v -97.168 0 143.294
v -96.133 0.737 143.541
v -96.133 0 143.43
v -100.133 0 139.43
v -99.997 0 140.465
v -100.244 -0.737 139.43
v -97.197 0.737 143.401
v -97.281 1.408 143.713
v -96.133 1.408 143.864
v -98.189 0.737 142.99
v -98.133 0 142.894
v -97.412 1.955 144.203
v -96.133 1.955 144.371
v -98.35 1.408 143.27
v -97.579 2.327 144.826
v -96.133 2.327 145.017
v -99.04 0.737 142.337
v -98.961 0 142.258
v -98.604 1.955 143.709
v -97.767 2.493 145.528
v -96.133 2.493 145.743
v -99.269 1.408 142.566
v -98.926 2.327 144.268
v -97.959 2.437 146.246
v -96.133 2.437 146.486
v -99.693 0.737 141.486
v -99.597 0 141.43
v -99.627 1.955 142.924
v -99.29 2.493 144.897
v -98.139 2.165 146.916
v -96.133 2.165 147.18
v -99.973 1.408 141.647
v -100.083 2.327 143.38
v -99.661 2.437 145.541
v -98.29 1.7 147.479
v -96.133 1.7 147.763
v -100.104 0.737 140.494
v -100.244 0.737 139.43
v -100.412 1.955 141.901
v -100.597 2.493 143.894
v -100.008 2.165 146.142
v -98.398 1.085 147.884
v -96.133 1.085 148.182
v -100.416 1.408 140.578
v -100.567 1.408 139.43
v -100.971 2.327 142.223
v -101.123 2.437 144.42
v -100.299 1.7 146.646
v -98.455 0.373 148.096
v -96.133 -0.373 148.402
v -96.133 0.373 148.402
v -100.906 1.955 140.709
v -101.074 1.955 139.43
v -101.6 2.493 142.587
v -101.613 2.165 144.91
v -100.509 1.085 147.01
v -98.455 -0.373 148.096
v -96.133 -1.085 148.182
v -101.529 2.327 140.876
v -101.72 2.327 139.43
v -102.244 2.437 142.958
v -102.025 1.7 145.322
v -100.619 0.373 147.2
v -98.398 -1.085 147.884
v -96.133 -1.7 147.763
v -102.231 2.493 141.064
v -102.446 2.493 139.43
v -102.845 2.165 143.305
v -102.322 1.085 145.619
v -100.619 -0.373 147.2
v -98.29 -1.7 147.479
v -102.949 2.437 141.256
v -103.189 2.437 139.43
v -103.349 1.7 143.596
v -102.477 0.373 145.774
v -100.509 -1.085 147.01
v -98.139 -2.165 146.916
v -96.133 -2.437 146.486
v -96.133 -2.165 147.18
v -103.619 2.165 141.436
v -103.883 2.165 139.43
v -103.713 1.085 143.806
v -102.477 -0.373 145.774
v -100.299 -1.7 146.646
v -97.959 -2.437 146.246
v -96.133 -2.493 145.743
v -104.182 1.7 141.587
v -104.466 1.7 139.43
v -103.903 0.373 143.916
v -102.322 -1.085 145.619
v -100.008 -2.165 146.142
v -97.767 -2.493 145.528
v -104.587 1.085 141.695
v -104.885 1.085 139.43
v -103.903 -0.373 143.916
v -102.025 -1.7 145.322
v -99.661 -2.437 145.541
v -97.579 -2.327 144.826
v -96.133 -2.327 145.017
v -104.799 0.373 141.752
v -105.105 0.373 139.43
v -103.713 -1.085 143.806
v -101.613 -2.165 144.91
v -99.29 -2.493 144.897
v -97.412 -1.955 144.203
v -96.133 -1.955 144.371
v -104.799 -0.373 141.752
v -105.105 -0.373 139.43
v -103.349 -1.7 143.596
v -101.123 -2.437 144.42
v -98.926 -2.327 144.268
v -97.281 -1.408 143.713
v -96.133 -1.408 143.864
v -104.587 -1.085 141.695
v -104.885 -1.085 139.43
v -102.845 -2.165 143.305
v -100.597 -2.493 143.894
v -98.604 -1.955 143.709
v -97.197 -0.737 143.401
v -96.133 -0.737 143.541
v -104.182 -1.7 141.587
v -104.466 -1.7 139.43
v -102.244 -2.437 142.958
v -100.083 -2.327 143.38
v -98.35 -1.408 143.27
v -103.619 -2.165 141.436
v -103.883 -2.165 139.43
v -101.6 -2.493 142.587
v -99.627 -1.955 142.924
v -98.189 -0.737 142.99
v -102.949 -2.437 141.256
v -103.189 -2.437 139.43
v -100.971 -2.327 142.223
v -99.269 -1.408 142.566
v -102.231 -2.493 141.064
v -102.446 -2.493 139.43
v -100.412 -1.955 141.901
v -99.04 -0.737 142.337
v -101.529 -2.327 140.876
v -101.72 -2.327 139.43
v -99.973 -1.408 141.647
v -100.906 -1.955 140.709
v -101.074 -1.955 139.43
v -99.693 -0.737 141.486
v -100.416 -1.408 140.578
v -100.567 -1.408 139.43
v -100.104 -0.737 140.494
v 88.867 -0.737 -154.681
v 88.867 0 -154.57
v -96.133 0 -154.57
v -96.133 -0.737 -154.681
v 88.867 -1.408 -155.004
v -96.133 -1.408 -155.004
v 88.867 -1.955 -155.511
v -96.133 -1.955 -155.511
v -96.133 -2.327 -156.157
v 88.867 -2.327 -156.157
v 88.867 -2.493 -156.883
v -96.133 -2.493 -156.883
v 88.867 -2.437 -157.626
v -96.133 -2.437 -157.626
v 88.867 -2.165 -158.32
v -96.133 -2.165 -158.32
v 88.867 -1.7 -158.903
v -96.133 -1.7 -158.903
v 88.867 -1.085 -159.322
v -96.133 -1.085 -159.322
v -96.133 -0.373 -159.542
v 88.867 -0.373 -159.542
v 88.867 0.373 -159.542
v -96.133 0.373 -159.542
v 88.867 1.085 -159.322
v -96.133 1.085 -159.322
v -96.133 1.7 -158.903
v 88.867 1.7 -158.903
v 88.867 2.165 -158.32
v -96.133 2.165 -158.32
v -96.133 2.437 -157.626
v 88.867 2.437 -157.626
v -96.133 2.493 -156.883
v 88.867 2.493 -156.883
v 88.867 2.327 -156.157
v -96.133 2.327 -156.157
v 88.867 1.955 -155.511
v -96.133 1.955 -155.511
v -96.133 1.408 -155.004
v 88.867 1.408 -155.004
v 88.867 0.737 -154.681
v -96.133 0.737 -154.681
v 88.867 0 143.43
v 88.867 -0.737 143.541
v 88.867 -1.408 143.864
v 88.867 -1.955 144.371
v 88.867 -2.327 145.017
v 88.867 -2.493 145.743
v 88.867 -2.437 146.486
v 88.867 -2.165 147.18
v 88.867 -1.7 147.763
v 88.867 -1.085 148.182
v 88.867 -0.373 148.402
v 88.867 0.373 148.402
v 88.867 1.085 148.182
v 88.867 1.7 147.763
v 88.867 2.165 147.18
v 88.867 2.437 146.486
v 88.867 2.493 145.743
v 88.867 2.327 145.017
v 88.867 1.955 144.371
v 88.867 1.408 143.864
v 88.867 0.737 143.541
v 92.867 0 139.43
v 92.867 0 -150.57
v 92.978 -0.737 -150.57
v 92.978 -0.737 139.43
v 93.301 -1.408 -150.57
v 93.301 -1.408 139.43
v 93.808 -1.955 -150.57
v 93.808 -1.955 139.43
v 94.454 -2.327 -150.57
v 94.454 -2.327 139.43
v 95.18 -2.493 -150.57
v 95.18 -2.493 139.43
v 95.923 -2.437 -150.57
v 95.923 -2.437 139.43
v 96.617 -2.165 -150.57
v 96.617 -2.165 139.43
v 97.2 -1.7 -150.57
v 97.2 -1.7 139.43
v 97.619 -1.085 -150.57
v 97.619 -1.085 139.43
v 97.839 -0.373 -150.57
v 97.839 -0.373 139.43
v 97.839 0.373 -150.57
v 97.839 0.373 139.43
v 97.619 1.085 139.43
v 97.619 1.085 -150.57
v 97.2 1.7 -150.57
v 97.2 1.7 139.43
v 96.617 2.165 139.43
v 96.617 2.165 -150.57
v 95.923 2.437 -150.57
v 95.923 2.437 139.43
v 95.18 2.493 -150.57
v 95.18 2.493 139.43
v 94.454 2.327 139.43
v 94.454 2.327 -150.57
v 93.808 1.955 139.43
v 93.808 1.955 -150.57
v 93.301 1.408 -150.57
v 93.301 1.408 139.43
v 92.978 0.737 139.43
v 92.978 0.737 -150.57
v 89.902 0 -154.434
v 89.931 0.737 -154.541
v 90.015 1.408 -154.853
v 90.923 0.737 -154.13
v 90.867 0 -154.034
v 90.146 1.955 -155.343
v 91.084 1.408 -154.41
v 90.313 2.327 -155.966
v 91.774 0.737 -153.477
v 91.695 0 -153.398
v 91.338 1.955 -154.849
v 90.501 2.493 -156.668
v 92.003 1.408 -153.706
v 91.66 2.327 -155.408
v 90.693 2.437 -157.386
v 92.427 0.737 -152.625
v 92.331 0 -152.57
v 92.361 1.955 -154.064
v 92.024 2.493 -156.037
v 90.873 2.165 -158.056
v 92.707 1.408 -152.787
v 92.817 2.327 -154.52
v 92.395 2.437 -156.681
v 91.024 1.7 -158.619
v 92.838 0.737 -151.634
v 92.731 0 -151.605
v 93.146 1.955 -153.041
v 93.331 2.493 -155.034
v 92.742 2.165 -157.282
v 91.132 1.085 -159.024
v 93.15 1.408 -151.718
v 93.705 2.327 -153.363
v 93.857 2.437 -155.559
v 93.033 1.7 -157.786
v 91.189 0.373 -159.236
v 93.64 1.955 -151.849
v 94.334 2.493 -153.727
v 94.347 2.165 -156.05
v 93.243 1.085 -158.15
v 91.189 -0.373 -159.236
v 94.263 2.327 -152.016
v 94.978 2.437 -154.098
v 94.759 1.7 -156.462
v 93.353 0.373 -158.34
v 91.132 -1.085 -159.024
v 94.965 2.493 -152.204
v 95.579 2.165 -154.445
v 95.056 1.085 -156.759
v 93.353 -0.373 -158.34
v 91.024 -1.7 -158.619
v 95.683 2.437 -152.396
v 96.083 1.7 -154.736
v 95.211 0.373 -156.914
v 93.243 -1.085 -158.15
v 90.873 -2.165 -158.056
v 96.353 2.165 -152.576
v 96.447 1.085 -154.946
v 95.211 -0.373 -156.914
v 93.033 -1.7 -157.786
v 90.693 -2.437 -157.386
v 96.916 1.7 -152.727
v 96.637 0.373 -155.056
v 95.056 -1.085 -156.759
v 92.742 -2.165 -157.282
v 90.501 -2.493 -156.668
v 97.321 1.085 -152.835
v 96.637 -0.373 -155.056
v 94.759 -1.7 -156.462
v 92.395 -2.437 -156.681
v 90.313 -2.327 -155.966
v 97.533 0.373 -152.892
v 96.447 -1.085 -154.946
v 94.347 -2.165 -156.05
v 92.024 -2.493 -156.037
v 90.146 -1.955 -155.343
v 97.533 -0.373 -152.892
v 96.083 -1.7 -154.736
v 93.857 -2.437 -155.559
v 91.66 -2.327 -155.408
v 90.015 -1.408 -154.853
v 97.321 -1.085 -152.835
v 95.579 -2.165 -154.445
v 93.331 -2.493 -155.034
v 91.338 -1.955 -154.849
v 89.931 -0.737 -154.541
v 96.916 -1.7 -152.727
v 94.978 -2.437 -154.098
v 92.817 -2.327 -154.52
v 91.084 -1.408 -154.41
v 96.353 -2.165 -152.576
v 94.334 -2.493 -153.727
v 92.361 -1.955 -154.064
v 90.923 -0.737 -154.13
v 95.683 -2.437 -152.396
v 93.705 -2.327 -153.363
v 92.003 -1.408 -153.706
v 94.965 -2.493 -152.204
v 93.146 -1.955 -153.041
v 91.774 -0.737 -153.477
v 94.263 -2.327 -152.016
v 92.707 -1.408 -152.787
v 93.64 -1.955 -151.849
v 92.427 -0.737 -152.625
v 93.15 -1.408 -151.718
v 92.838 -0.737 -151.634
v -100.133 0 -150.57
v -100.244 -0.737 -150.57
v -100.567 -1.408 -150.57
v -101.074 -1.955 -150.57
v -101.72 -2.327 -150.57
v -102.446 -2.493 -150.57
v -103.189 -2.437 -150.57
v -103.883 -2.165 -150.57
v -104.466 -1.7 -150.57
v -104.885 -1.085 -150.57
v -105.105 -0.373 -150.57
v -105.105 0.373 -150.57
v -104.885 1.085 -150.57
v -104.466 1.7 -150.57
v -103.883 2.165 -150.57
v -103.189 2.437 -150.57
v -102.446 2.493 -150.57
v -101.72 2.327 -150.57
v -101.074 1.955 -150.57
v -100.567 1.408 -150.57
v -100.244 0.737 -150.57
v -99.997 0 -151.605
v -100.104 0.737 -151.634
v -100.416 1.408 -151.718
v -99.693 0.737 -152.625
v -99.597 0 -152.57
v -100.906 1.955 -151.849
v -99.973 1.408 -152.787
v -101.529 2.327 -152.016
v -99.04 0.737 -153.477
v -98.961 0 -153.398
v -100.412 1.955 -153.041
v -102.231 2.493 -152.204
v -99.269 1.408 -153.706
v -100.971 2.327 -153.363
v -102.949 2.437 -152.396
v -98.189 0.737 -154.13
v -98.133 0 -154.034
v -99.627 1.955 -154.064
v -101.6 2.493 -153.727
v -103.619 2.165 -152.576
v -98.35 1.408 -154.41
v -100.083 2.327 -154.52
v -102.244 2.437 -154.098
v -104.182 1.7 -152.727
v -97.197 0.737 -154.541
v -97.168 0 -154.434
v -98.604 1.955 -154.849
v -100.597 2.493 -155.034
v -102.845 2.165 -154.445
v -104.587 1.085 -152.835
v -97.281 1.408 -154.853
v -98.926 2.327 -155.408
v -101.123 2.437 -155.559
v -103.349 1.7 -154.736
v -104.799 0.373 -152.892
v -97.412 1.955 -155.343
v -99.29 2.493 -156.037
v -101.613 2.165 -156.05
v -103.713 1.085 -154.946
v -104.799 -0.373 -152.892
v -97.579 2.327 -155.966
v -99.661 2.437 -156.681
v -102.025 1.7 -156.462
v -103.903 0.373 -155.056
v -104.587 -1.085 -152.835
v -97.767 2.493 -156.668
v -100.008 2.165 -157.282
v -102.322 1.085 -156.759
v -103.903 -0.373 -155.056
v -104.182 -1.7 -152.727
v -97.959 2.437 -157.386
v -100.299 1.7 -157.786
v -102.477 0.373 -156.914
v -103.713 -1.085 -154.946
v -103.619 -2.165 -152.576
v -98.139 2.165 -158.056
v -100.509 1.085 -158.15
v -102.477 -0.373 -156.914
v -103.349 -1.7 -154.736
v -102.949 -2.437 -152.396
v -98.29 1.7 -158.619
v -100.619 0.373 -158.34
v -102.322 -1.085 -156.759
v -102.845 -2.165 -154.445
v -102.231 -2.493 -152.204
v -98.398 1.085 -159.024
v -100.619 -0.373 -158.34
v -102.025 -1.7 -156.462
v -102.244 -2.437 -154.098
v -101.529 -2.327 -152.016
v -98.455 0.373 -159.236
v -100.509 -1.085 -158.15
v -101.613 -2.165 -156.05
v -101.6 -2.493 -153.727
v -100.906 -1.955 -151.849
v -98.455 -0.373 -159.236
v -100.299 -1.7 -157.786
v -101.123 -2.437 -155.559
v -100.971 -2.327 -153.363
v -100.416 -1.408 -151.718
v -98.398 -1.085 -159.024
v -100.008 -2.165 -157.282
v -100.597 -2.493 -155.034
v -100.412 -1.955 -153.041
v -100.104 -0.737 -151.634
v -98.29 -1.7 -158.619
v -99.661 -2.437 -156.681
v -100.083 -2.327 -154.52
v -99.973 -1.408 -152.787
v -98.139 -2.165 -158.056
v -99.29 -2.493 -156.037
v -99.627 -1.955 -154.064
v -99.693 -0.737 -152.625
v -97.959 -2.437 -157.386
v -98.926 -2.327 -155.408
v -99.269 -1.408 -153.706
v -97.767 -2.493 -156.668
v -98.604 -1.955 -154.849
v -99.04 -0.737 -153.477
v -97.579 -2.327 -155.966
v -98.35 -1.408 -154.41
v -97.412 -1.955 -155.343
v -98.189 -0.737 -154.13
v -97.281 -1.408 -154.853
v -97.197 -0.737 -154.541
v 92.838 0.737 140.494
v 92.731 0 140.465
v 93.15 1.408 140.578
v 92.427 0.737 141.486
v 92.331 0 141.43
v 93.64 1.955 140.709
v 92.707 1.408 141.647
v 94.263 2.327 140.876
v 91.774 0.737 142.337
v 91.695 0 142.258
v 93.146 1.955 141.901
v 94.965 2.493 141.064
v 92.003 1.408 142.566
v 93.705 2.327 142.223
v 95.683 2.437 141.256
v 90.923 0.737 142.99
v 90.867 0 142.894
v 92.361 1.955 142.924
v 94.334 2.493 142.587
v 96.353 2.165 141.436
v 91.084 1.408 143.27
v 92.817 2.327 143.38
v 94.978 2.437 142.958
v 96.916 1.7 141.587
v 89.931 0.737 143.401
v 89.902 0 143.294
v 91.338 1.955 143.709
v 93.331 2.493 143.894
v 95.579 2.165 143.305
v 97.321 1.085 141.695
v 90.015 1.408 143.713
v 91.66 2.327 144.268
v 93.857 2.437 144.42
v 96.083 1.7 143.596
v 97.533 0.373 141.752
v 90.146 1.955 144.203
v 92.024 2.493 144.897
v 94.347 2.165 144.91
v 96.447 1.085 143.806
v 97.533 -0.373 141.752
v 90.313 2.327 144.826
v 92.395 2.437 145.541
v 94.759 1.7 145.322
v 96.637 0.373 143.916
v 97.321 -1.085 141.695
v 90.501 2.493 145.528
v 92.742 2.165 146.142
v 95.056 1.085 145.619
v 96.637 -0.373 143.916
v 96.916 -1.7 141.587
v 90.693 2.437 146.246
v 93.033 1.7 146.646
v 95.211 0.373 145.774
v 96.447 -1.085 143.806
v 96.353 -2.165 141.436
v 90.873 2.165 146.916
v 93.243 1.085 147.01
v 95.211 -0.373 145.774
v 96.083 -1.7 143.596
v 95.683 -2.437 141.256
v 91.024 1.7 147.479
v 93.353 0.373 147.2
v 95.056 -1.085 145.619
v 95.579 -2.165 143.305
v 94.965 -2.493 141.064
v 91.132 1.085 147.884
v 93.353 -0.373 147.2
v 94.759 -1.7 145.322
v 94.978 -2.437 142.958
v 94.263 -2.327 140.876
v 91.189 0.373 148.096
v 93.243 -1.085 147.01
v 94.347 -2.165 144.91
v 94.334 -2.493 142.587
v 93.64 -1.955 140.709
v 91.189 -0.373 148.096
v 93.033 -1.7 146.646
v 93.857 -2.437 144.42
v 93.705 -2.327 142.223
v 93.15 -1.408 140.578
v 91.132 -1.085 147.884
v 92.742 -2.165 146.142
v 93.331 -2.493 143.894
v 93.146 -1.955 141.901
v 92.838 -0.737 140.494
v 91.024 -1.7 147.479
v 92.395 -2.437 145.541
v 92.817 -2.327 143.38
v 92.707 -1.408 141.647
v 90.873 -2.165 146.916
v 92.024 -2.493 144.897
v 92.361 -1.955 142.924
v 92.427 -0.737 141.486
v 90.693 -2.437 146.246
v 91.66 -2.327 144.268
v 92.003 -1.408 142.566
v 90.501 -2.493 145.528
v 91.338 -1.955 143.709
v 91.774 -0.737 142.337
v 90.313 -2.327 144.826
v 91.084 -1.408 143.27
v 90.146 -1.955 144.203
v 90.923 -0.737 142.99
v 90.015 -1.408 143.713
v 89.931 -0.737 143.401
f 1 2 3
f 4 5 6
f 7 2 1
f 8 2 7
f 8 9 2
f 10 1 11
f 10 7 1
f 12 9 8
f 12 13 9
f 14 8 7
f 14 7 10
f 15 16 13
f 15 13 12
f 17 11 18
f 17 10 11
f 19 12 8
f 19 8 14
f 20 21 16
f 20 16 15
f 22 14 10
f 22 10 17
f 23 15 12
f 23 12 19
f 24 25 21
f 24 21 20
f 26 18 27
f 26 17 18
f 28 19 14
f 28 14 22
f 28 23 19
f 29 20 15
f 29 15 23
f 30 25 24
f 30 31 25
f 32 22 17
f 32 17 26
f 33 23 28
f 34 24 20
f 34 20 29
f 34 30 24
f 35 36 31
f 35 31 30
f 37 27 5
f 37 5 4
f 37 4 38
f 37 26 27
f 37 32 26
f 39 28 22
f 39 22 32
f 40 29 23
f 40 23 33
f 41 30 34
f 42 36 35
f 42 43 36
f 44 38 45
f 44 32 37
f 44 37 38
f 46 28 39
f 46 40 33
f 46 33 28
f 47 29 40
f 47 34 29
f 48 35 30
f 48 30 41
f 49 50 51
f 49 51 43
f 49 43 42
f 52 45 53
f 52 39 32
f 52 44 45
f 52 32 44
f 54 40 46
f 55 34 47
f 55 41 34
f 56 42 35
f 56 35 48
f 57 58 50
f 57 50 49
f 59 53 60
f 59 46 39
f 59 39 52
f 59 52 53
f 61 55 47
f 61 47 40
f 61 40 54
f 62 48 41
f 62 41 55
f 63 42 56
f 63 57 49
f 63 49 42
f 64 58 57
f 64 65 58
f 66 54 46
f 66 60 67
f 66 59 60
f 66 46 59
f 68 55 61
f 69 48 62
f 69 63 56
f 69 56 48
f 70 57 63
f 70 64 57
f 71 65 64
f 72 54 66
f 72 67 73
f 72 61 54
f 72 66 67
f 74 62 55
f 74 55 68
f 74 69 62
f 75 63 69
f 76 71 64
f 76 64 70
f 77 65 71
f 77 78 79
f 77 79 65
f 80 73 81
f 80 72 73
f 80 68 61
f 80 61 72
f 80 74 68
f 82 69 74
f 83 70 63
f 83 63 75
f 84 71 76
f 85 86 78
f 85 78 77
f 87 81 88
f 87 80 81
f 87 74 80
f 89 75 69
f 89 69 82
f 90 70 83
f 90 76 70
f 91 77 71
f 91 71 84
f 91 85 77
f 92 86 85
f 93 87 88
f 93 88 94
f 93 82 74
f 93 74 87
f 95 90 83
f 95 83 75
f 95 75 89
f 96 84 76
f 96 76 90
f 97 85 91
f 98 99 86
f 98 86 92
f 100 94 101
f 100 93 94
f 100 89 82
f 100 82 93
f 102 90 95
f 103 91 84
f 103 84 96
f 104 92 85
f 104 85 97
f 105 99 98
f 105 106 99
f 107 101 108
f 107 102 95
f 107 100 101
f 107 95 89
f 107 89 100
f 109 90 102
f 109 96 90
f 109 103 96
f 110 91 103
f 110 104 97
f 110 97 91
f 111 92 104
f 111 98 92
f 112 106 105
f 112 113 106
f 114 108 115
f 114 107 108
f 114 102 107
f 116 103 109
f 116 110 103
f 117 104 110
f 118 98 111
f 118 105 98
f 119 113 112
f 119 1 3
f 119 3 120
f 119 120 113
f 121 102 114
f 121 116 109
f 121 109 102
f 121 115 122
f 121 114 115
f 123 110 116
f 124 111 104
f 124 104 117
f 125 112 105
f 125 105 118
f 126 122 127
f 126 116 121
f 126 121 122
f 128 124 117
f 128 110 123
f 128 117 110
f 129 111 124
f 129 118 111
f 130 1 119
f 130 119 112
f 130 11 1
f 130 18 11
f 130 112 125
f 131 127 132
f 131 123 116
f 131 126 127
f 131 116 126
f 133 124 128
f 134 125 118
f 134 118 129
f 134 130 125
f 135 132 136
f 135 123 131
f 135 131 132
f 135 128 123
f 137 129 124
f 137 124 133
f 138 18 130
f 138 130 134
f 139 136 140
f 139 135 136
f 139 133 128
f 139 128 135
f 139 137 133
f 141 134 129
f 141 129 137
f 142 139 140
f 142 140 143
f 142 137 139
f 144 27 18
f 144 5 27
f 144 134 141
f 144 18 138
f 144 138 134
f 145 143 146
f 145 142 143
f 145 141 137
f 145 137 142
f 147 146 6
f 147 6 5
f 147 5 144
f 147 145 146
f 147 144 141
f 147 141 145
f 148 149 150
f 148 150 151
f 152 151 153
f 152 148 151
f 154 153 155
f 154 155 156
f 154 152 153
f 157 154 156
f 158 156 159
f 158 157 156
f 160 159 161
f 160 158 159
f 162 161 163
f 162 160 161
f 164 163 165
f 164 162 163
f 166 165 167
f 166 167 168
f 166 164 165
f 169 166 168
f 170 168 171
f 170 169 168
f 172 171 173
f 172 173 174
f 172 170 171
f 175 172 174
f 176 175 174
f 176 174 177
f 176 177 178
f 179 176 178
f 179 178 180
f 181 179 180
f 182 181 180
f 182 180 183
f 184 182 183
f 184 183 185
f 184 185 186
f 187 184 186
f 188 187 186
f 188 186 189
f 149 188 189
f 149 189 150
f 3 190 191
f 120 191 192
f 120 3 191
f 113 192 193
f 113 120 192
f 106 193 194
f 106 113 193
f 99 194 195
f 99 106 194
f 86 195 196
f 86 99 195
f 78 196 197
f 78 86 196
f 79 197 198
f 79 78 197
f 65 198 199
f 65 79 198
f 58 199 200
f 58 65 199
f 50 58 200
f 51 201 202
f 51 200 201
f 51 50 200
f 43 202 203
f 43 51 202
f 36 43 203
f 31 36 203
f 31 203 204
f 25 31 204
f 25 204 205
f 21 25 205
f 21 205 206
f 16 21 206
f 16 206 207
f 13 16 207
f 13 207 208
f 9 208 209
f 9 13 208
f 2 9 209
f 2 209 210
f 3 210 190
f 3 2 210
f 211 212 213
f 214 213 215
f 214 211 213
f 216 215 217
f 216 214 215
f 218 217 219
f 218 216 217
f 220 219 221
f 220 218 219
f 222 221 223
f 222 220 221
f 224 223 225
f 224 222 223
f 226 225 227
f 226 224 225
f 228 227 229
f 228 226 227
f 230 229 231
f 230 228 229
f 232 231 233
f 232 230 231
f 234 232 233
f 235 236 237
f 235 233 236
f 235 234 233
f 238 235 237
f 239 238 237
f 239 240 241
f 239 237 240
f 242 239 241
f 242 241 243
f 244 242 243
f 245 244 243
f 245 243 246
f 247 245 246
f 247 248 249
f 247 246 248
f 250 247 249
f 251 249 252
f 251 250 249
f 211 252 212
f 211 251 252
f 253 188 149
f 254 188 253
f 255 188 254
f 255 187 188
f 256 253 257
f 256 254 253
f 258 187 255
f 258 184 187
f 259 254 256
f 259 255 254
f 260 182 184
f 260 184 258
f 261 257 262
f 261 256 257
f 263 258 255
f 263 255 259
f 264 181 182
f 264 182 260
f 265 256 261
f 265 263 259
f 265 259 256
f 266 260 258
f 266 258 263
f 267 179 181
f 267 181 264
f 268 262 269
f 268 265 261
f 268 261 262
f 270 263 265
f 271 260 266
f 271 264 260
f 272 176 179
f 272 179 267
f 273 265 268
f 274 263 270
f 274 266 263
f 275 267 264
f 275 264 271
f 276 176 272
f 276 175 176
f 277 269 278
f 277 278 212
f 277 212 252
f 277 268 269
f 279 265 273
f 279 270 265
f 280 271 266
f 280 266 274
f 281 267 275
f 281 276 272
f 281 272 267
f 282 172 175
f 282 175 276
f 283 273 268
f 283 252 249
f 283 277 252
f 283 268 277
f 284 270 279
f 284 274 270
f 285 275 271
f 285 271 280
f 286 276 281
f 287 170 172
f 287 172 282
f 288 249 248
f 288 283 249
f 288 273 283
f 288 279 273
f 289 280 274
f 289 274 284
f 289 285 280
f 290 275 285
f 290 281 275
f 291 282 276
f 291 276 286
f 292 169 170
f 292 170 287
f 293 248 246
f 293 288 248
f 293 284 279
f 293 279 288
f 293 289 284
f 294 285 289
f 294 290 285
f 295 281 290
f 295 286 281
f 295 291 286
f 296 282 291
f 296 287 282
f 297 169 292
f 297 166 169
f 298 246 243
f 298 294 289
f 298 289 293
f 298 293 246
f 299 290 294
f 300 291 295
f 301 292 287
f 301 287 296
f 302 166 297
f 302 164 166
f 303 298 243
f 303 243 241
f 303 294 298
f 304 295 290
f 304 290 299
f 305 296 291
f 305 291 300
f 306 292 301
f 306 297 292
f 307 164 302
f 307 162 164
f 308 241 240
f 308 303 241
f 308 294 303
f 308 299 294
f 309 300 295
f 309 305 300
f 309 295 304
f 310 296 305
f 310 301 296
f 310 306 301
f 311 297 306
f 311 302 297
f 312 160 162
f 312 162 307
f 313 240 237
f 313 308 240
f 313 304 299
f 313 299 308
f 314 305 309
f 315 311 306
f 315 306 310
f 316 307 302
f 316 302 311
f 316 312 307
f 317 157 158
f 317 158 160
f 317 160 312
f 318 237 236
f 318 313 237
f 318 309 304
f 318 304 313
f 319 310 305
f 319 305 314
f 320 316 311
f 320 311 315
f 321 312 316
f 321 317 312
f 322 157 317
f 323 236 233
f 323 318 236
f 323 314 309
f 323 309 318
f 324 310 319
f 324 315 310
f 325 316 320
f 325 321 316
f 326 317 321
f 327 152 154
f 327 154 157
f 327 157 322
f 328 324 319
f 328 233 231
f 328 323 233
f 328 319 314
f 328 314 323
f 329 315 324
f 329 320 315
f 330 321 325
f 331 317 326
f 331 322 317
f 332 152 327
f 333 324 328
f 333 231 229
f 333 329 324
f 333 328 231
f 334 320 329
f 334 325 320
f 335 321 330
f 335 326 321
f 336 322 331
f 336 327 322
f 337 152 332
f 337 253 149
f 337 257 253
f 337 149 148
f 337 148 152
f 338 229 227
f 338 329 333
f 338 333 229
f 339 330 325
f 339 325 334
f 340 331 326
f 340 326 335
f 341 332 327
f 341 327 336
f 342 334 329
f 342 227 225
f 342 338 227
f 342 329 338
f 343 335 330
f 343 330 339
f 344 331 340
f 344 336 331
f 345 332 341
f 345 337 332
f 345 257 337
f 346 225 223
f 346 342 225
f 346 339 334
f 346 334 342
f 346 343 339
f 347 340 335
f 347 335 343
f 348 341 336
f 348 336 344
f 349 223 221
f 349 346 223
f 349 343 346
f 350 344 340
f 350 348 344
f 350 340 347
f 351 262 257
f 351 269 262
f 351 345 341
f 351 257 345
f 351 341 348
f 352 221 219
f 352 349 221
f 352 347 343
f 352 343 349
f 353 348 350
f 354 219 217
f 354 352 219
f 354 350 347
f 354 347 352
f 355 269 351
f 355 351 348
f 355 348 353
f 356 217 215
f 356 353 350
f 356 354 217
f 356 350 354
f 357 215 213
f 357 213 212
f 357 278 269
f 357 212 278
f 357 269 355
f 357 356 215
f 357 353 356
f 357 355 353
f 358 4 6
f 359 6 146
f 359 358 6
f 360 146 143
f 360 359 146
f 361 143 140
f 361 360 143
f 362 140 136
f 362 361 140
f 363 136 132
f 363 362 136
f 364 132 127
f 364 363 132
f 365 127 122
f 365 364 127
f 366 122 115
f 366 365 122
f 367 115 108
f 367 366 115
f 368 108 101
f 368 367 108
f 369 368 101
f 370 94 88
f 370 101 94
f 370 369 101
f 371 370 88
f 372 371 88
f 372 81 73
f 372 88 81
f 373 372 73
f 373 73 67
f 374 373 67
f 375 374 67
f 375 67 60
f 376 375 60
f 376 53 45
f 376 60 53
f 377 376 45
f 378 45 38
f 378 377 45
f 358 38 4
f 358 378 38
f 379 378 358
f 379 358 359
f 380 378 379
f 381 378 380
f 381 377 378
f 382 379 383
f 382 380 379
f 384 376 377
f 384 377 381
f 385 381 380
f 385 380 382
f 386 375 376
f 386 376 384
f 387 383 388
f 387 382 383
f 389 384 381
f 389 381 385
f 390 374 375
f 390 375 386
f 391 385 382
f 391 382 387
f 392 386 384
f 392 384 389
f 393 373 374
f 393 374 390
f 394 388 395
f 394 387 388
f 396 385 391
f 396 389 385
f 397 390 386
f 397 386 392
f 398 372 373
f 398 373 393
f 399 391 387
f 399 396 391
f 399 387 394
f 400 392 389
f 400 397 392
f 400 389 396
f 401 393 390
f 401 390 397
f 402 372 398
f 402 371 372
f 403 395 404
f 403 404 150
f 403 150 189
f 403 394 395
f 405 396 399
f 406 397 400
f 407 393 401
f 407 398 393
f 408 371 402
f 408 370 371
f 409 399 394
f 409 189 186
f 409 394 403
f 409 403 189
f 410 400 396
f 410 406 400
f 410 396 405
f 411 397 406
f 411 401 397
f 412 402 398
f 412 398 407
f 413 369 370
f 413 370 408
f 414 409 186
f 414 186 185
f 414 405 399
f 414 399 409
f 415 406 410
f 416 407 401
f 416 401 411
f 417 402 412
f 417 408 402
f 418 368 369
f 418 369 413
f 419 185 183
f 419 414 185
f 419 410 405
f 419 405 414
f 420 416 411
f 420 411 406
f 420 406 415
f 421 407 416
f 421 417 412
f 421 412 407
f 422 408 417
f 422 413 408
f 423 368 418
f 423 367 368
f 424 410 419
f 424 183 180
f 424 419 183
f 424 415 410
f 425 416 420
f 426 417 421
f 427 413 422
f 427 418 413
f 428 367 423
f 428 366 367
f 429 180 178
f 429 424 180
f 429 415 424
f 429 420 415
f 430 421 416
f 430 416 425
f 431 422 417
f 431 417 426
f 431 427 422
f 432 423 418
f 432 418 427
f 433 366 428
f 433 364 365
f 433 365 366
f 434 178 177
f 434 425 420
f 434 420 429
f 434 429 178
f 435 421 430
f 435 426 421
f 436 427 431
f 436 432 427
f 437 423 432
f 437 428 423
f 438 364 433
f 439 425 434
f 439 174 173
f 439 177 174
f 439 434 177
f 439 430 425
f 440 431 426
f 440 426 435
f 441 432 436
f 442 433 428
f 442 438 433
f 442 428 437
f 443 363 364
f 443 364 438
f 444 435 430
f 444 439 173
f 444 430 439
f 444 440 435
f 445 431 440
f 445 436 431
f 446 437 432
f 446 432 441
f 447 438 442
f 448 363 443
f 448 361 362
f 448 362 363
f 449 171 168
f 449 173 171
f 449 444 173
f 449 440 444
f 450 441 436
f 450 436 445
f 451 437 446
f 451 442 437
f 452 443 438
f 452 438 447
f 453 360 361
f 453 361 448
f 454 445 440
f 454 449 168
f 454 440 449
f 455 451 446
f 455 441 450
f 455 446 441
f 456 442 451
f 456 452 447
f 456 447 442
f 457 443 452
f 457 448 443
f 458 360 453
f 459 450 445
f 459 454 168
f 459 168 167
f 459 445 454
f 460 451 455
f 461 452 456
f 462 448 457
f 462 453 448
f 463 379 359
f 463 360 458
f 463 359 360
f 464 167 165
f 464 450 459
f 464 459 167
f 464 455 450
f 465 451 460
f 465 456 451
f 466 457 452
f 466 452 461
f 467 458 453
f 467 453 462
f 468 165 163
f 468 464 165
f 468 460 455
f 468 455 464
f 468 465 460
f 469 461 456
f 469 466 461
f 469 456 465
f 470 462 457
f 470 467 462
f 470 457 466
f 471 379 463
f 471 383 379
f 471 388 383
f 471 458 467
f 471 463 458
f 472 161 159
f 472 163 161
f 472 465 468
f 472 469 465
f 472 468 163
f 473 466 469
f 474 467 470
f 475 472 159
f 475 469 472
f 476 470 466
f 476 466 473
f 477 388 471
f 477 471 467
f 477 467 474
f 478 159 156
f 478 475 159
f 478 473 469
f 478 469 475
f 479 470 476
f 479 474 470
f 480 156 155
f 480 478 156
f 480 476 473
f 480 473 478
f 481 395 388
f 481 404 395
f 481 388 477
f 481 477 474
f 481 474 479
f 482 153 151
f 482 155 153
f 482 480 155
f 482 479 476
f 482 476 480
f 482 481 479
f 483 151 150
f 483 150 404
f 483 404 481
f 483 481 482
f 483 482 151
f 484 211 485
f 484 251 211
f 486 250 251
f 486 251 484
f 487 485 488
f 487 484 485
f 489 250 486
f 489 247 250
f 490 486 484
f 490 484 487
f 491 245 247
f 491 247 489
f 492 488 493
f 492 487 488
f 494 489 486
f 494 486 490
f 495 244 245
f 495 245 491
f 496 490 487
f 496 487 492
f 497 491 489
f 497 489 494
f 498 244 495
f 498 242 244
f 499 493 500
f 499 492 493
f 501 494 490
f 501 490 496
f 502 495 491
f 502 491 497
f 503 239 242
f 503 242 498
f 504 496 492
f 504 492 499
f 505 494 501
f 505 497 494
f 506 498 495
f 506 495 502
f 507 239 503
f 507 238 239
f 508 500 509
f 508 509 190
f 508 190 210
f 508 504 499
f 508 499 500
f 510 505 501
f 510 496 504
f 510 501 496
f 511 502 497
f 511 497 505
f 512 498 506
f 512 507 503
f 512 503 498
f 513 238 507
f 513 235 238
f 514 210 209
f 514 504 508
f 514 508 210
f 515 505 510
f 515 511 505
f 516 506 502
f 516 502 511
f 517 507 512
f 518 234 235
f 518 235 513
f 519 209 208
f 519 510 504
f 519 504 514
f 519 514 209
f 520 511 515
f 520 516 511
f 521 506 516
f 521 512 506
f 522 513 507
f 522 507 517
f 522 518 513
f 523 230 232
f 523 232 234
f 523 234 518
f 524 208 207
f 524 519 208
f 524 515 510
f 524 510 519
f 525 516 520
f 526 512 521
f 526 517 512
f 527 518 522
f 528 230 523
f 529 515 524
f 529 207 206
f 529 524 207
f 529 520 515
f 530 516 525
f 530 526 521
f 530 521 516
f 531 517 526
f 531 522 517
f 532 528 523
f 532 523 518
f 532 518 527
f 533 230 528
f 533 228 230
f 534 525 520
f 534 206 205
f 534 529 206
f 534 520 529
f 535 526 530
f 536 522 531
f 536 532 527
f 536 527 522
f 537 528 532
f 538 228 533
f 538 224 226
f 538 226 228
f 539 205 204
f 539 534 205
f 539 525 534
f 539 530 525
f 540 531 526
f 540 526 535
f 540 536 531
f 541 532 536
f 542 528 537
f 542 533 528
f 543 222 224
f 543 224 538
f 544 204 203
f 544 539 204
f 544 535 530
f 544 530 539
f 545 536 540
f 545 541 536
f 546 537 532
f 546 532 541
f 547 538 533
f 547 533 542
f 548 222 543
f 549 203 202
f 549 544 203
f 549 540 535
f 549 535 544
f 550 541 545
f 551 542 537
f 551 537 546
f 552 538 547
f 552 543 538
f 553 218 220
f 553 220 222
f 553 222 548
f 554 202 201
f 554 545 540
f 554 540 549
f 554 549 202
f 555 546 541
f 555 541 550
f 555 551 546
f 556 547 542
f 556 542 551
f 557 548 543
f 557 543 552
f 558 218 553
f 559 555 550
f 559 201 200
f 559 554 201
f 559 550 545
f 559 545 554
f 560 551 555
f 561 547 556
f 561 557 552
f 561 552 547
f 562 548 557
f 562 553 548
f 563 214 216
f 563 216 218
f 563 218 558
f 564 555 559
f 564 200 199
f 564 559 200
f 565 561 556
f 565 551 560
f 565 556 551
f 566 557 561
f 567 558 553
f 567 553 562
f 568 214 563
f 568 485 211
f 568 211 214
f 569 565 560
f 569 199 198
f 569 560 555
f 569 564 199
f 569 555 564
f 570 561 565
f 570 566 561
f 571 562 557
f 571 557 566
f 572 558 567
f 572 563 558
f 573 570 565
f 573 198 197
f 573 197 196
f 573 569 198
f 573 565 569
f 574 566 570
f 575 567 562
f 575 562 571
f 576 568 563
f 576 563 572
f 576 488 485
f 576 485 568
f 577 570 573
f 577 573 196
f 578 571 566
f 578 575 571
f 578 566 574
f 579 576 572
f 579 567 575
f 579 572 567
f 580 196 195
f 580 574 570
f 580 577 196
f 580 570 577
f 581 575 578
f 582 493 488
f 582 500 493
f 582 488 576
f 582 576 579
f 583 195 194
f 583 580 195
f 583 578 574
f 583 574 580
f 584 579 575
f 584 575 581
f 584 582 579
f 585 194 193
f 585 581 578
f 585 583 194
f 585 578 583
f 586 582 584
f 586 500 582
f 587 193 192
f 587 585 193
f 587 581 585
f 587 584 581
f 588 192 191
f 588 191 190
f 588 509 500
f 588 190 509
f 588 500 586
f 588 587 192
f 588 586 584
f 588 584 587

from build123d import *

# Parameters (mm, degrees)
SWEEP1_PROFILE_R = 2.5


with BuildPart() as part:
    # Sweep1: sweep along a path in Sketch1
    with BuildLine(Plane(origin=(0, 0, 0), x_dir=(1, 0, 0), z_dir=(0, 1, 0))) as sweep1_path:
        Line((-96.132982369, 157.069933949), (88.867017631, 157.069933949))
        ThreePointArc((88.867017631, 157.069933949), (93.463211709, 155.166128026), (95.367017631, 150.569933949))
        Line((95.367017631, 150.569933949), (95.367017631, -139.430066051))
        ThreePointArc((95.367017631, -139.430066051), (93.463211709, -144.026260129), (88.867017631, -145.930066051))
        Line((88.867017631, -145.930066051), (-96.132982369, -145.930066051))
        ThreePointArc((-96.132982369, -145.930066051), (-100.729176446, -144.026260129), (-102.632982369, -139.430066051))
        Line((-102.632982369, -139.430066051), (-102.632982369, 150.569933949))
        ThreePointArc((-102.632982369, 150.569933949), (-100.729176446, 155.166128026), (-96.132982369, 157.069933949))
    # Sweep1 profile (on start of the path) → Sweep1 (sweep)
    with BuildSketch(Plane(origin=(-96.132982369, 0, -157.069933949), x_dir=(0, 0, 1), z_dir=(1, 0, 0))):
        Circle(SWEEP1_PROFILE_R)
    sweep(path=sweep1_path.line)


solid = part.part
